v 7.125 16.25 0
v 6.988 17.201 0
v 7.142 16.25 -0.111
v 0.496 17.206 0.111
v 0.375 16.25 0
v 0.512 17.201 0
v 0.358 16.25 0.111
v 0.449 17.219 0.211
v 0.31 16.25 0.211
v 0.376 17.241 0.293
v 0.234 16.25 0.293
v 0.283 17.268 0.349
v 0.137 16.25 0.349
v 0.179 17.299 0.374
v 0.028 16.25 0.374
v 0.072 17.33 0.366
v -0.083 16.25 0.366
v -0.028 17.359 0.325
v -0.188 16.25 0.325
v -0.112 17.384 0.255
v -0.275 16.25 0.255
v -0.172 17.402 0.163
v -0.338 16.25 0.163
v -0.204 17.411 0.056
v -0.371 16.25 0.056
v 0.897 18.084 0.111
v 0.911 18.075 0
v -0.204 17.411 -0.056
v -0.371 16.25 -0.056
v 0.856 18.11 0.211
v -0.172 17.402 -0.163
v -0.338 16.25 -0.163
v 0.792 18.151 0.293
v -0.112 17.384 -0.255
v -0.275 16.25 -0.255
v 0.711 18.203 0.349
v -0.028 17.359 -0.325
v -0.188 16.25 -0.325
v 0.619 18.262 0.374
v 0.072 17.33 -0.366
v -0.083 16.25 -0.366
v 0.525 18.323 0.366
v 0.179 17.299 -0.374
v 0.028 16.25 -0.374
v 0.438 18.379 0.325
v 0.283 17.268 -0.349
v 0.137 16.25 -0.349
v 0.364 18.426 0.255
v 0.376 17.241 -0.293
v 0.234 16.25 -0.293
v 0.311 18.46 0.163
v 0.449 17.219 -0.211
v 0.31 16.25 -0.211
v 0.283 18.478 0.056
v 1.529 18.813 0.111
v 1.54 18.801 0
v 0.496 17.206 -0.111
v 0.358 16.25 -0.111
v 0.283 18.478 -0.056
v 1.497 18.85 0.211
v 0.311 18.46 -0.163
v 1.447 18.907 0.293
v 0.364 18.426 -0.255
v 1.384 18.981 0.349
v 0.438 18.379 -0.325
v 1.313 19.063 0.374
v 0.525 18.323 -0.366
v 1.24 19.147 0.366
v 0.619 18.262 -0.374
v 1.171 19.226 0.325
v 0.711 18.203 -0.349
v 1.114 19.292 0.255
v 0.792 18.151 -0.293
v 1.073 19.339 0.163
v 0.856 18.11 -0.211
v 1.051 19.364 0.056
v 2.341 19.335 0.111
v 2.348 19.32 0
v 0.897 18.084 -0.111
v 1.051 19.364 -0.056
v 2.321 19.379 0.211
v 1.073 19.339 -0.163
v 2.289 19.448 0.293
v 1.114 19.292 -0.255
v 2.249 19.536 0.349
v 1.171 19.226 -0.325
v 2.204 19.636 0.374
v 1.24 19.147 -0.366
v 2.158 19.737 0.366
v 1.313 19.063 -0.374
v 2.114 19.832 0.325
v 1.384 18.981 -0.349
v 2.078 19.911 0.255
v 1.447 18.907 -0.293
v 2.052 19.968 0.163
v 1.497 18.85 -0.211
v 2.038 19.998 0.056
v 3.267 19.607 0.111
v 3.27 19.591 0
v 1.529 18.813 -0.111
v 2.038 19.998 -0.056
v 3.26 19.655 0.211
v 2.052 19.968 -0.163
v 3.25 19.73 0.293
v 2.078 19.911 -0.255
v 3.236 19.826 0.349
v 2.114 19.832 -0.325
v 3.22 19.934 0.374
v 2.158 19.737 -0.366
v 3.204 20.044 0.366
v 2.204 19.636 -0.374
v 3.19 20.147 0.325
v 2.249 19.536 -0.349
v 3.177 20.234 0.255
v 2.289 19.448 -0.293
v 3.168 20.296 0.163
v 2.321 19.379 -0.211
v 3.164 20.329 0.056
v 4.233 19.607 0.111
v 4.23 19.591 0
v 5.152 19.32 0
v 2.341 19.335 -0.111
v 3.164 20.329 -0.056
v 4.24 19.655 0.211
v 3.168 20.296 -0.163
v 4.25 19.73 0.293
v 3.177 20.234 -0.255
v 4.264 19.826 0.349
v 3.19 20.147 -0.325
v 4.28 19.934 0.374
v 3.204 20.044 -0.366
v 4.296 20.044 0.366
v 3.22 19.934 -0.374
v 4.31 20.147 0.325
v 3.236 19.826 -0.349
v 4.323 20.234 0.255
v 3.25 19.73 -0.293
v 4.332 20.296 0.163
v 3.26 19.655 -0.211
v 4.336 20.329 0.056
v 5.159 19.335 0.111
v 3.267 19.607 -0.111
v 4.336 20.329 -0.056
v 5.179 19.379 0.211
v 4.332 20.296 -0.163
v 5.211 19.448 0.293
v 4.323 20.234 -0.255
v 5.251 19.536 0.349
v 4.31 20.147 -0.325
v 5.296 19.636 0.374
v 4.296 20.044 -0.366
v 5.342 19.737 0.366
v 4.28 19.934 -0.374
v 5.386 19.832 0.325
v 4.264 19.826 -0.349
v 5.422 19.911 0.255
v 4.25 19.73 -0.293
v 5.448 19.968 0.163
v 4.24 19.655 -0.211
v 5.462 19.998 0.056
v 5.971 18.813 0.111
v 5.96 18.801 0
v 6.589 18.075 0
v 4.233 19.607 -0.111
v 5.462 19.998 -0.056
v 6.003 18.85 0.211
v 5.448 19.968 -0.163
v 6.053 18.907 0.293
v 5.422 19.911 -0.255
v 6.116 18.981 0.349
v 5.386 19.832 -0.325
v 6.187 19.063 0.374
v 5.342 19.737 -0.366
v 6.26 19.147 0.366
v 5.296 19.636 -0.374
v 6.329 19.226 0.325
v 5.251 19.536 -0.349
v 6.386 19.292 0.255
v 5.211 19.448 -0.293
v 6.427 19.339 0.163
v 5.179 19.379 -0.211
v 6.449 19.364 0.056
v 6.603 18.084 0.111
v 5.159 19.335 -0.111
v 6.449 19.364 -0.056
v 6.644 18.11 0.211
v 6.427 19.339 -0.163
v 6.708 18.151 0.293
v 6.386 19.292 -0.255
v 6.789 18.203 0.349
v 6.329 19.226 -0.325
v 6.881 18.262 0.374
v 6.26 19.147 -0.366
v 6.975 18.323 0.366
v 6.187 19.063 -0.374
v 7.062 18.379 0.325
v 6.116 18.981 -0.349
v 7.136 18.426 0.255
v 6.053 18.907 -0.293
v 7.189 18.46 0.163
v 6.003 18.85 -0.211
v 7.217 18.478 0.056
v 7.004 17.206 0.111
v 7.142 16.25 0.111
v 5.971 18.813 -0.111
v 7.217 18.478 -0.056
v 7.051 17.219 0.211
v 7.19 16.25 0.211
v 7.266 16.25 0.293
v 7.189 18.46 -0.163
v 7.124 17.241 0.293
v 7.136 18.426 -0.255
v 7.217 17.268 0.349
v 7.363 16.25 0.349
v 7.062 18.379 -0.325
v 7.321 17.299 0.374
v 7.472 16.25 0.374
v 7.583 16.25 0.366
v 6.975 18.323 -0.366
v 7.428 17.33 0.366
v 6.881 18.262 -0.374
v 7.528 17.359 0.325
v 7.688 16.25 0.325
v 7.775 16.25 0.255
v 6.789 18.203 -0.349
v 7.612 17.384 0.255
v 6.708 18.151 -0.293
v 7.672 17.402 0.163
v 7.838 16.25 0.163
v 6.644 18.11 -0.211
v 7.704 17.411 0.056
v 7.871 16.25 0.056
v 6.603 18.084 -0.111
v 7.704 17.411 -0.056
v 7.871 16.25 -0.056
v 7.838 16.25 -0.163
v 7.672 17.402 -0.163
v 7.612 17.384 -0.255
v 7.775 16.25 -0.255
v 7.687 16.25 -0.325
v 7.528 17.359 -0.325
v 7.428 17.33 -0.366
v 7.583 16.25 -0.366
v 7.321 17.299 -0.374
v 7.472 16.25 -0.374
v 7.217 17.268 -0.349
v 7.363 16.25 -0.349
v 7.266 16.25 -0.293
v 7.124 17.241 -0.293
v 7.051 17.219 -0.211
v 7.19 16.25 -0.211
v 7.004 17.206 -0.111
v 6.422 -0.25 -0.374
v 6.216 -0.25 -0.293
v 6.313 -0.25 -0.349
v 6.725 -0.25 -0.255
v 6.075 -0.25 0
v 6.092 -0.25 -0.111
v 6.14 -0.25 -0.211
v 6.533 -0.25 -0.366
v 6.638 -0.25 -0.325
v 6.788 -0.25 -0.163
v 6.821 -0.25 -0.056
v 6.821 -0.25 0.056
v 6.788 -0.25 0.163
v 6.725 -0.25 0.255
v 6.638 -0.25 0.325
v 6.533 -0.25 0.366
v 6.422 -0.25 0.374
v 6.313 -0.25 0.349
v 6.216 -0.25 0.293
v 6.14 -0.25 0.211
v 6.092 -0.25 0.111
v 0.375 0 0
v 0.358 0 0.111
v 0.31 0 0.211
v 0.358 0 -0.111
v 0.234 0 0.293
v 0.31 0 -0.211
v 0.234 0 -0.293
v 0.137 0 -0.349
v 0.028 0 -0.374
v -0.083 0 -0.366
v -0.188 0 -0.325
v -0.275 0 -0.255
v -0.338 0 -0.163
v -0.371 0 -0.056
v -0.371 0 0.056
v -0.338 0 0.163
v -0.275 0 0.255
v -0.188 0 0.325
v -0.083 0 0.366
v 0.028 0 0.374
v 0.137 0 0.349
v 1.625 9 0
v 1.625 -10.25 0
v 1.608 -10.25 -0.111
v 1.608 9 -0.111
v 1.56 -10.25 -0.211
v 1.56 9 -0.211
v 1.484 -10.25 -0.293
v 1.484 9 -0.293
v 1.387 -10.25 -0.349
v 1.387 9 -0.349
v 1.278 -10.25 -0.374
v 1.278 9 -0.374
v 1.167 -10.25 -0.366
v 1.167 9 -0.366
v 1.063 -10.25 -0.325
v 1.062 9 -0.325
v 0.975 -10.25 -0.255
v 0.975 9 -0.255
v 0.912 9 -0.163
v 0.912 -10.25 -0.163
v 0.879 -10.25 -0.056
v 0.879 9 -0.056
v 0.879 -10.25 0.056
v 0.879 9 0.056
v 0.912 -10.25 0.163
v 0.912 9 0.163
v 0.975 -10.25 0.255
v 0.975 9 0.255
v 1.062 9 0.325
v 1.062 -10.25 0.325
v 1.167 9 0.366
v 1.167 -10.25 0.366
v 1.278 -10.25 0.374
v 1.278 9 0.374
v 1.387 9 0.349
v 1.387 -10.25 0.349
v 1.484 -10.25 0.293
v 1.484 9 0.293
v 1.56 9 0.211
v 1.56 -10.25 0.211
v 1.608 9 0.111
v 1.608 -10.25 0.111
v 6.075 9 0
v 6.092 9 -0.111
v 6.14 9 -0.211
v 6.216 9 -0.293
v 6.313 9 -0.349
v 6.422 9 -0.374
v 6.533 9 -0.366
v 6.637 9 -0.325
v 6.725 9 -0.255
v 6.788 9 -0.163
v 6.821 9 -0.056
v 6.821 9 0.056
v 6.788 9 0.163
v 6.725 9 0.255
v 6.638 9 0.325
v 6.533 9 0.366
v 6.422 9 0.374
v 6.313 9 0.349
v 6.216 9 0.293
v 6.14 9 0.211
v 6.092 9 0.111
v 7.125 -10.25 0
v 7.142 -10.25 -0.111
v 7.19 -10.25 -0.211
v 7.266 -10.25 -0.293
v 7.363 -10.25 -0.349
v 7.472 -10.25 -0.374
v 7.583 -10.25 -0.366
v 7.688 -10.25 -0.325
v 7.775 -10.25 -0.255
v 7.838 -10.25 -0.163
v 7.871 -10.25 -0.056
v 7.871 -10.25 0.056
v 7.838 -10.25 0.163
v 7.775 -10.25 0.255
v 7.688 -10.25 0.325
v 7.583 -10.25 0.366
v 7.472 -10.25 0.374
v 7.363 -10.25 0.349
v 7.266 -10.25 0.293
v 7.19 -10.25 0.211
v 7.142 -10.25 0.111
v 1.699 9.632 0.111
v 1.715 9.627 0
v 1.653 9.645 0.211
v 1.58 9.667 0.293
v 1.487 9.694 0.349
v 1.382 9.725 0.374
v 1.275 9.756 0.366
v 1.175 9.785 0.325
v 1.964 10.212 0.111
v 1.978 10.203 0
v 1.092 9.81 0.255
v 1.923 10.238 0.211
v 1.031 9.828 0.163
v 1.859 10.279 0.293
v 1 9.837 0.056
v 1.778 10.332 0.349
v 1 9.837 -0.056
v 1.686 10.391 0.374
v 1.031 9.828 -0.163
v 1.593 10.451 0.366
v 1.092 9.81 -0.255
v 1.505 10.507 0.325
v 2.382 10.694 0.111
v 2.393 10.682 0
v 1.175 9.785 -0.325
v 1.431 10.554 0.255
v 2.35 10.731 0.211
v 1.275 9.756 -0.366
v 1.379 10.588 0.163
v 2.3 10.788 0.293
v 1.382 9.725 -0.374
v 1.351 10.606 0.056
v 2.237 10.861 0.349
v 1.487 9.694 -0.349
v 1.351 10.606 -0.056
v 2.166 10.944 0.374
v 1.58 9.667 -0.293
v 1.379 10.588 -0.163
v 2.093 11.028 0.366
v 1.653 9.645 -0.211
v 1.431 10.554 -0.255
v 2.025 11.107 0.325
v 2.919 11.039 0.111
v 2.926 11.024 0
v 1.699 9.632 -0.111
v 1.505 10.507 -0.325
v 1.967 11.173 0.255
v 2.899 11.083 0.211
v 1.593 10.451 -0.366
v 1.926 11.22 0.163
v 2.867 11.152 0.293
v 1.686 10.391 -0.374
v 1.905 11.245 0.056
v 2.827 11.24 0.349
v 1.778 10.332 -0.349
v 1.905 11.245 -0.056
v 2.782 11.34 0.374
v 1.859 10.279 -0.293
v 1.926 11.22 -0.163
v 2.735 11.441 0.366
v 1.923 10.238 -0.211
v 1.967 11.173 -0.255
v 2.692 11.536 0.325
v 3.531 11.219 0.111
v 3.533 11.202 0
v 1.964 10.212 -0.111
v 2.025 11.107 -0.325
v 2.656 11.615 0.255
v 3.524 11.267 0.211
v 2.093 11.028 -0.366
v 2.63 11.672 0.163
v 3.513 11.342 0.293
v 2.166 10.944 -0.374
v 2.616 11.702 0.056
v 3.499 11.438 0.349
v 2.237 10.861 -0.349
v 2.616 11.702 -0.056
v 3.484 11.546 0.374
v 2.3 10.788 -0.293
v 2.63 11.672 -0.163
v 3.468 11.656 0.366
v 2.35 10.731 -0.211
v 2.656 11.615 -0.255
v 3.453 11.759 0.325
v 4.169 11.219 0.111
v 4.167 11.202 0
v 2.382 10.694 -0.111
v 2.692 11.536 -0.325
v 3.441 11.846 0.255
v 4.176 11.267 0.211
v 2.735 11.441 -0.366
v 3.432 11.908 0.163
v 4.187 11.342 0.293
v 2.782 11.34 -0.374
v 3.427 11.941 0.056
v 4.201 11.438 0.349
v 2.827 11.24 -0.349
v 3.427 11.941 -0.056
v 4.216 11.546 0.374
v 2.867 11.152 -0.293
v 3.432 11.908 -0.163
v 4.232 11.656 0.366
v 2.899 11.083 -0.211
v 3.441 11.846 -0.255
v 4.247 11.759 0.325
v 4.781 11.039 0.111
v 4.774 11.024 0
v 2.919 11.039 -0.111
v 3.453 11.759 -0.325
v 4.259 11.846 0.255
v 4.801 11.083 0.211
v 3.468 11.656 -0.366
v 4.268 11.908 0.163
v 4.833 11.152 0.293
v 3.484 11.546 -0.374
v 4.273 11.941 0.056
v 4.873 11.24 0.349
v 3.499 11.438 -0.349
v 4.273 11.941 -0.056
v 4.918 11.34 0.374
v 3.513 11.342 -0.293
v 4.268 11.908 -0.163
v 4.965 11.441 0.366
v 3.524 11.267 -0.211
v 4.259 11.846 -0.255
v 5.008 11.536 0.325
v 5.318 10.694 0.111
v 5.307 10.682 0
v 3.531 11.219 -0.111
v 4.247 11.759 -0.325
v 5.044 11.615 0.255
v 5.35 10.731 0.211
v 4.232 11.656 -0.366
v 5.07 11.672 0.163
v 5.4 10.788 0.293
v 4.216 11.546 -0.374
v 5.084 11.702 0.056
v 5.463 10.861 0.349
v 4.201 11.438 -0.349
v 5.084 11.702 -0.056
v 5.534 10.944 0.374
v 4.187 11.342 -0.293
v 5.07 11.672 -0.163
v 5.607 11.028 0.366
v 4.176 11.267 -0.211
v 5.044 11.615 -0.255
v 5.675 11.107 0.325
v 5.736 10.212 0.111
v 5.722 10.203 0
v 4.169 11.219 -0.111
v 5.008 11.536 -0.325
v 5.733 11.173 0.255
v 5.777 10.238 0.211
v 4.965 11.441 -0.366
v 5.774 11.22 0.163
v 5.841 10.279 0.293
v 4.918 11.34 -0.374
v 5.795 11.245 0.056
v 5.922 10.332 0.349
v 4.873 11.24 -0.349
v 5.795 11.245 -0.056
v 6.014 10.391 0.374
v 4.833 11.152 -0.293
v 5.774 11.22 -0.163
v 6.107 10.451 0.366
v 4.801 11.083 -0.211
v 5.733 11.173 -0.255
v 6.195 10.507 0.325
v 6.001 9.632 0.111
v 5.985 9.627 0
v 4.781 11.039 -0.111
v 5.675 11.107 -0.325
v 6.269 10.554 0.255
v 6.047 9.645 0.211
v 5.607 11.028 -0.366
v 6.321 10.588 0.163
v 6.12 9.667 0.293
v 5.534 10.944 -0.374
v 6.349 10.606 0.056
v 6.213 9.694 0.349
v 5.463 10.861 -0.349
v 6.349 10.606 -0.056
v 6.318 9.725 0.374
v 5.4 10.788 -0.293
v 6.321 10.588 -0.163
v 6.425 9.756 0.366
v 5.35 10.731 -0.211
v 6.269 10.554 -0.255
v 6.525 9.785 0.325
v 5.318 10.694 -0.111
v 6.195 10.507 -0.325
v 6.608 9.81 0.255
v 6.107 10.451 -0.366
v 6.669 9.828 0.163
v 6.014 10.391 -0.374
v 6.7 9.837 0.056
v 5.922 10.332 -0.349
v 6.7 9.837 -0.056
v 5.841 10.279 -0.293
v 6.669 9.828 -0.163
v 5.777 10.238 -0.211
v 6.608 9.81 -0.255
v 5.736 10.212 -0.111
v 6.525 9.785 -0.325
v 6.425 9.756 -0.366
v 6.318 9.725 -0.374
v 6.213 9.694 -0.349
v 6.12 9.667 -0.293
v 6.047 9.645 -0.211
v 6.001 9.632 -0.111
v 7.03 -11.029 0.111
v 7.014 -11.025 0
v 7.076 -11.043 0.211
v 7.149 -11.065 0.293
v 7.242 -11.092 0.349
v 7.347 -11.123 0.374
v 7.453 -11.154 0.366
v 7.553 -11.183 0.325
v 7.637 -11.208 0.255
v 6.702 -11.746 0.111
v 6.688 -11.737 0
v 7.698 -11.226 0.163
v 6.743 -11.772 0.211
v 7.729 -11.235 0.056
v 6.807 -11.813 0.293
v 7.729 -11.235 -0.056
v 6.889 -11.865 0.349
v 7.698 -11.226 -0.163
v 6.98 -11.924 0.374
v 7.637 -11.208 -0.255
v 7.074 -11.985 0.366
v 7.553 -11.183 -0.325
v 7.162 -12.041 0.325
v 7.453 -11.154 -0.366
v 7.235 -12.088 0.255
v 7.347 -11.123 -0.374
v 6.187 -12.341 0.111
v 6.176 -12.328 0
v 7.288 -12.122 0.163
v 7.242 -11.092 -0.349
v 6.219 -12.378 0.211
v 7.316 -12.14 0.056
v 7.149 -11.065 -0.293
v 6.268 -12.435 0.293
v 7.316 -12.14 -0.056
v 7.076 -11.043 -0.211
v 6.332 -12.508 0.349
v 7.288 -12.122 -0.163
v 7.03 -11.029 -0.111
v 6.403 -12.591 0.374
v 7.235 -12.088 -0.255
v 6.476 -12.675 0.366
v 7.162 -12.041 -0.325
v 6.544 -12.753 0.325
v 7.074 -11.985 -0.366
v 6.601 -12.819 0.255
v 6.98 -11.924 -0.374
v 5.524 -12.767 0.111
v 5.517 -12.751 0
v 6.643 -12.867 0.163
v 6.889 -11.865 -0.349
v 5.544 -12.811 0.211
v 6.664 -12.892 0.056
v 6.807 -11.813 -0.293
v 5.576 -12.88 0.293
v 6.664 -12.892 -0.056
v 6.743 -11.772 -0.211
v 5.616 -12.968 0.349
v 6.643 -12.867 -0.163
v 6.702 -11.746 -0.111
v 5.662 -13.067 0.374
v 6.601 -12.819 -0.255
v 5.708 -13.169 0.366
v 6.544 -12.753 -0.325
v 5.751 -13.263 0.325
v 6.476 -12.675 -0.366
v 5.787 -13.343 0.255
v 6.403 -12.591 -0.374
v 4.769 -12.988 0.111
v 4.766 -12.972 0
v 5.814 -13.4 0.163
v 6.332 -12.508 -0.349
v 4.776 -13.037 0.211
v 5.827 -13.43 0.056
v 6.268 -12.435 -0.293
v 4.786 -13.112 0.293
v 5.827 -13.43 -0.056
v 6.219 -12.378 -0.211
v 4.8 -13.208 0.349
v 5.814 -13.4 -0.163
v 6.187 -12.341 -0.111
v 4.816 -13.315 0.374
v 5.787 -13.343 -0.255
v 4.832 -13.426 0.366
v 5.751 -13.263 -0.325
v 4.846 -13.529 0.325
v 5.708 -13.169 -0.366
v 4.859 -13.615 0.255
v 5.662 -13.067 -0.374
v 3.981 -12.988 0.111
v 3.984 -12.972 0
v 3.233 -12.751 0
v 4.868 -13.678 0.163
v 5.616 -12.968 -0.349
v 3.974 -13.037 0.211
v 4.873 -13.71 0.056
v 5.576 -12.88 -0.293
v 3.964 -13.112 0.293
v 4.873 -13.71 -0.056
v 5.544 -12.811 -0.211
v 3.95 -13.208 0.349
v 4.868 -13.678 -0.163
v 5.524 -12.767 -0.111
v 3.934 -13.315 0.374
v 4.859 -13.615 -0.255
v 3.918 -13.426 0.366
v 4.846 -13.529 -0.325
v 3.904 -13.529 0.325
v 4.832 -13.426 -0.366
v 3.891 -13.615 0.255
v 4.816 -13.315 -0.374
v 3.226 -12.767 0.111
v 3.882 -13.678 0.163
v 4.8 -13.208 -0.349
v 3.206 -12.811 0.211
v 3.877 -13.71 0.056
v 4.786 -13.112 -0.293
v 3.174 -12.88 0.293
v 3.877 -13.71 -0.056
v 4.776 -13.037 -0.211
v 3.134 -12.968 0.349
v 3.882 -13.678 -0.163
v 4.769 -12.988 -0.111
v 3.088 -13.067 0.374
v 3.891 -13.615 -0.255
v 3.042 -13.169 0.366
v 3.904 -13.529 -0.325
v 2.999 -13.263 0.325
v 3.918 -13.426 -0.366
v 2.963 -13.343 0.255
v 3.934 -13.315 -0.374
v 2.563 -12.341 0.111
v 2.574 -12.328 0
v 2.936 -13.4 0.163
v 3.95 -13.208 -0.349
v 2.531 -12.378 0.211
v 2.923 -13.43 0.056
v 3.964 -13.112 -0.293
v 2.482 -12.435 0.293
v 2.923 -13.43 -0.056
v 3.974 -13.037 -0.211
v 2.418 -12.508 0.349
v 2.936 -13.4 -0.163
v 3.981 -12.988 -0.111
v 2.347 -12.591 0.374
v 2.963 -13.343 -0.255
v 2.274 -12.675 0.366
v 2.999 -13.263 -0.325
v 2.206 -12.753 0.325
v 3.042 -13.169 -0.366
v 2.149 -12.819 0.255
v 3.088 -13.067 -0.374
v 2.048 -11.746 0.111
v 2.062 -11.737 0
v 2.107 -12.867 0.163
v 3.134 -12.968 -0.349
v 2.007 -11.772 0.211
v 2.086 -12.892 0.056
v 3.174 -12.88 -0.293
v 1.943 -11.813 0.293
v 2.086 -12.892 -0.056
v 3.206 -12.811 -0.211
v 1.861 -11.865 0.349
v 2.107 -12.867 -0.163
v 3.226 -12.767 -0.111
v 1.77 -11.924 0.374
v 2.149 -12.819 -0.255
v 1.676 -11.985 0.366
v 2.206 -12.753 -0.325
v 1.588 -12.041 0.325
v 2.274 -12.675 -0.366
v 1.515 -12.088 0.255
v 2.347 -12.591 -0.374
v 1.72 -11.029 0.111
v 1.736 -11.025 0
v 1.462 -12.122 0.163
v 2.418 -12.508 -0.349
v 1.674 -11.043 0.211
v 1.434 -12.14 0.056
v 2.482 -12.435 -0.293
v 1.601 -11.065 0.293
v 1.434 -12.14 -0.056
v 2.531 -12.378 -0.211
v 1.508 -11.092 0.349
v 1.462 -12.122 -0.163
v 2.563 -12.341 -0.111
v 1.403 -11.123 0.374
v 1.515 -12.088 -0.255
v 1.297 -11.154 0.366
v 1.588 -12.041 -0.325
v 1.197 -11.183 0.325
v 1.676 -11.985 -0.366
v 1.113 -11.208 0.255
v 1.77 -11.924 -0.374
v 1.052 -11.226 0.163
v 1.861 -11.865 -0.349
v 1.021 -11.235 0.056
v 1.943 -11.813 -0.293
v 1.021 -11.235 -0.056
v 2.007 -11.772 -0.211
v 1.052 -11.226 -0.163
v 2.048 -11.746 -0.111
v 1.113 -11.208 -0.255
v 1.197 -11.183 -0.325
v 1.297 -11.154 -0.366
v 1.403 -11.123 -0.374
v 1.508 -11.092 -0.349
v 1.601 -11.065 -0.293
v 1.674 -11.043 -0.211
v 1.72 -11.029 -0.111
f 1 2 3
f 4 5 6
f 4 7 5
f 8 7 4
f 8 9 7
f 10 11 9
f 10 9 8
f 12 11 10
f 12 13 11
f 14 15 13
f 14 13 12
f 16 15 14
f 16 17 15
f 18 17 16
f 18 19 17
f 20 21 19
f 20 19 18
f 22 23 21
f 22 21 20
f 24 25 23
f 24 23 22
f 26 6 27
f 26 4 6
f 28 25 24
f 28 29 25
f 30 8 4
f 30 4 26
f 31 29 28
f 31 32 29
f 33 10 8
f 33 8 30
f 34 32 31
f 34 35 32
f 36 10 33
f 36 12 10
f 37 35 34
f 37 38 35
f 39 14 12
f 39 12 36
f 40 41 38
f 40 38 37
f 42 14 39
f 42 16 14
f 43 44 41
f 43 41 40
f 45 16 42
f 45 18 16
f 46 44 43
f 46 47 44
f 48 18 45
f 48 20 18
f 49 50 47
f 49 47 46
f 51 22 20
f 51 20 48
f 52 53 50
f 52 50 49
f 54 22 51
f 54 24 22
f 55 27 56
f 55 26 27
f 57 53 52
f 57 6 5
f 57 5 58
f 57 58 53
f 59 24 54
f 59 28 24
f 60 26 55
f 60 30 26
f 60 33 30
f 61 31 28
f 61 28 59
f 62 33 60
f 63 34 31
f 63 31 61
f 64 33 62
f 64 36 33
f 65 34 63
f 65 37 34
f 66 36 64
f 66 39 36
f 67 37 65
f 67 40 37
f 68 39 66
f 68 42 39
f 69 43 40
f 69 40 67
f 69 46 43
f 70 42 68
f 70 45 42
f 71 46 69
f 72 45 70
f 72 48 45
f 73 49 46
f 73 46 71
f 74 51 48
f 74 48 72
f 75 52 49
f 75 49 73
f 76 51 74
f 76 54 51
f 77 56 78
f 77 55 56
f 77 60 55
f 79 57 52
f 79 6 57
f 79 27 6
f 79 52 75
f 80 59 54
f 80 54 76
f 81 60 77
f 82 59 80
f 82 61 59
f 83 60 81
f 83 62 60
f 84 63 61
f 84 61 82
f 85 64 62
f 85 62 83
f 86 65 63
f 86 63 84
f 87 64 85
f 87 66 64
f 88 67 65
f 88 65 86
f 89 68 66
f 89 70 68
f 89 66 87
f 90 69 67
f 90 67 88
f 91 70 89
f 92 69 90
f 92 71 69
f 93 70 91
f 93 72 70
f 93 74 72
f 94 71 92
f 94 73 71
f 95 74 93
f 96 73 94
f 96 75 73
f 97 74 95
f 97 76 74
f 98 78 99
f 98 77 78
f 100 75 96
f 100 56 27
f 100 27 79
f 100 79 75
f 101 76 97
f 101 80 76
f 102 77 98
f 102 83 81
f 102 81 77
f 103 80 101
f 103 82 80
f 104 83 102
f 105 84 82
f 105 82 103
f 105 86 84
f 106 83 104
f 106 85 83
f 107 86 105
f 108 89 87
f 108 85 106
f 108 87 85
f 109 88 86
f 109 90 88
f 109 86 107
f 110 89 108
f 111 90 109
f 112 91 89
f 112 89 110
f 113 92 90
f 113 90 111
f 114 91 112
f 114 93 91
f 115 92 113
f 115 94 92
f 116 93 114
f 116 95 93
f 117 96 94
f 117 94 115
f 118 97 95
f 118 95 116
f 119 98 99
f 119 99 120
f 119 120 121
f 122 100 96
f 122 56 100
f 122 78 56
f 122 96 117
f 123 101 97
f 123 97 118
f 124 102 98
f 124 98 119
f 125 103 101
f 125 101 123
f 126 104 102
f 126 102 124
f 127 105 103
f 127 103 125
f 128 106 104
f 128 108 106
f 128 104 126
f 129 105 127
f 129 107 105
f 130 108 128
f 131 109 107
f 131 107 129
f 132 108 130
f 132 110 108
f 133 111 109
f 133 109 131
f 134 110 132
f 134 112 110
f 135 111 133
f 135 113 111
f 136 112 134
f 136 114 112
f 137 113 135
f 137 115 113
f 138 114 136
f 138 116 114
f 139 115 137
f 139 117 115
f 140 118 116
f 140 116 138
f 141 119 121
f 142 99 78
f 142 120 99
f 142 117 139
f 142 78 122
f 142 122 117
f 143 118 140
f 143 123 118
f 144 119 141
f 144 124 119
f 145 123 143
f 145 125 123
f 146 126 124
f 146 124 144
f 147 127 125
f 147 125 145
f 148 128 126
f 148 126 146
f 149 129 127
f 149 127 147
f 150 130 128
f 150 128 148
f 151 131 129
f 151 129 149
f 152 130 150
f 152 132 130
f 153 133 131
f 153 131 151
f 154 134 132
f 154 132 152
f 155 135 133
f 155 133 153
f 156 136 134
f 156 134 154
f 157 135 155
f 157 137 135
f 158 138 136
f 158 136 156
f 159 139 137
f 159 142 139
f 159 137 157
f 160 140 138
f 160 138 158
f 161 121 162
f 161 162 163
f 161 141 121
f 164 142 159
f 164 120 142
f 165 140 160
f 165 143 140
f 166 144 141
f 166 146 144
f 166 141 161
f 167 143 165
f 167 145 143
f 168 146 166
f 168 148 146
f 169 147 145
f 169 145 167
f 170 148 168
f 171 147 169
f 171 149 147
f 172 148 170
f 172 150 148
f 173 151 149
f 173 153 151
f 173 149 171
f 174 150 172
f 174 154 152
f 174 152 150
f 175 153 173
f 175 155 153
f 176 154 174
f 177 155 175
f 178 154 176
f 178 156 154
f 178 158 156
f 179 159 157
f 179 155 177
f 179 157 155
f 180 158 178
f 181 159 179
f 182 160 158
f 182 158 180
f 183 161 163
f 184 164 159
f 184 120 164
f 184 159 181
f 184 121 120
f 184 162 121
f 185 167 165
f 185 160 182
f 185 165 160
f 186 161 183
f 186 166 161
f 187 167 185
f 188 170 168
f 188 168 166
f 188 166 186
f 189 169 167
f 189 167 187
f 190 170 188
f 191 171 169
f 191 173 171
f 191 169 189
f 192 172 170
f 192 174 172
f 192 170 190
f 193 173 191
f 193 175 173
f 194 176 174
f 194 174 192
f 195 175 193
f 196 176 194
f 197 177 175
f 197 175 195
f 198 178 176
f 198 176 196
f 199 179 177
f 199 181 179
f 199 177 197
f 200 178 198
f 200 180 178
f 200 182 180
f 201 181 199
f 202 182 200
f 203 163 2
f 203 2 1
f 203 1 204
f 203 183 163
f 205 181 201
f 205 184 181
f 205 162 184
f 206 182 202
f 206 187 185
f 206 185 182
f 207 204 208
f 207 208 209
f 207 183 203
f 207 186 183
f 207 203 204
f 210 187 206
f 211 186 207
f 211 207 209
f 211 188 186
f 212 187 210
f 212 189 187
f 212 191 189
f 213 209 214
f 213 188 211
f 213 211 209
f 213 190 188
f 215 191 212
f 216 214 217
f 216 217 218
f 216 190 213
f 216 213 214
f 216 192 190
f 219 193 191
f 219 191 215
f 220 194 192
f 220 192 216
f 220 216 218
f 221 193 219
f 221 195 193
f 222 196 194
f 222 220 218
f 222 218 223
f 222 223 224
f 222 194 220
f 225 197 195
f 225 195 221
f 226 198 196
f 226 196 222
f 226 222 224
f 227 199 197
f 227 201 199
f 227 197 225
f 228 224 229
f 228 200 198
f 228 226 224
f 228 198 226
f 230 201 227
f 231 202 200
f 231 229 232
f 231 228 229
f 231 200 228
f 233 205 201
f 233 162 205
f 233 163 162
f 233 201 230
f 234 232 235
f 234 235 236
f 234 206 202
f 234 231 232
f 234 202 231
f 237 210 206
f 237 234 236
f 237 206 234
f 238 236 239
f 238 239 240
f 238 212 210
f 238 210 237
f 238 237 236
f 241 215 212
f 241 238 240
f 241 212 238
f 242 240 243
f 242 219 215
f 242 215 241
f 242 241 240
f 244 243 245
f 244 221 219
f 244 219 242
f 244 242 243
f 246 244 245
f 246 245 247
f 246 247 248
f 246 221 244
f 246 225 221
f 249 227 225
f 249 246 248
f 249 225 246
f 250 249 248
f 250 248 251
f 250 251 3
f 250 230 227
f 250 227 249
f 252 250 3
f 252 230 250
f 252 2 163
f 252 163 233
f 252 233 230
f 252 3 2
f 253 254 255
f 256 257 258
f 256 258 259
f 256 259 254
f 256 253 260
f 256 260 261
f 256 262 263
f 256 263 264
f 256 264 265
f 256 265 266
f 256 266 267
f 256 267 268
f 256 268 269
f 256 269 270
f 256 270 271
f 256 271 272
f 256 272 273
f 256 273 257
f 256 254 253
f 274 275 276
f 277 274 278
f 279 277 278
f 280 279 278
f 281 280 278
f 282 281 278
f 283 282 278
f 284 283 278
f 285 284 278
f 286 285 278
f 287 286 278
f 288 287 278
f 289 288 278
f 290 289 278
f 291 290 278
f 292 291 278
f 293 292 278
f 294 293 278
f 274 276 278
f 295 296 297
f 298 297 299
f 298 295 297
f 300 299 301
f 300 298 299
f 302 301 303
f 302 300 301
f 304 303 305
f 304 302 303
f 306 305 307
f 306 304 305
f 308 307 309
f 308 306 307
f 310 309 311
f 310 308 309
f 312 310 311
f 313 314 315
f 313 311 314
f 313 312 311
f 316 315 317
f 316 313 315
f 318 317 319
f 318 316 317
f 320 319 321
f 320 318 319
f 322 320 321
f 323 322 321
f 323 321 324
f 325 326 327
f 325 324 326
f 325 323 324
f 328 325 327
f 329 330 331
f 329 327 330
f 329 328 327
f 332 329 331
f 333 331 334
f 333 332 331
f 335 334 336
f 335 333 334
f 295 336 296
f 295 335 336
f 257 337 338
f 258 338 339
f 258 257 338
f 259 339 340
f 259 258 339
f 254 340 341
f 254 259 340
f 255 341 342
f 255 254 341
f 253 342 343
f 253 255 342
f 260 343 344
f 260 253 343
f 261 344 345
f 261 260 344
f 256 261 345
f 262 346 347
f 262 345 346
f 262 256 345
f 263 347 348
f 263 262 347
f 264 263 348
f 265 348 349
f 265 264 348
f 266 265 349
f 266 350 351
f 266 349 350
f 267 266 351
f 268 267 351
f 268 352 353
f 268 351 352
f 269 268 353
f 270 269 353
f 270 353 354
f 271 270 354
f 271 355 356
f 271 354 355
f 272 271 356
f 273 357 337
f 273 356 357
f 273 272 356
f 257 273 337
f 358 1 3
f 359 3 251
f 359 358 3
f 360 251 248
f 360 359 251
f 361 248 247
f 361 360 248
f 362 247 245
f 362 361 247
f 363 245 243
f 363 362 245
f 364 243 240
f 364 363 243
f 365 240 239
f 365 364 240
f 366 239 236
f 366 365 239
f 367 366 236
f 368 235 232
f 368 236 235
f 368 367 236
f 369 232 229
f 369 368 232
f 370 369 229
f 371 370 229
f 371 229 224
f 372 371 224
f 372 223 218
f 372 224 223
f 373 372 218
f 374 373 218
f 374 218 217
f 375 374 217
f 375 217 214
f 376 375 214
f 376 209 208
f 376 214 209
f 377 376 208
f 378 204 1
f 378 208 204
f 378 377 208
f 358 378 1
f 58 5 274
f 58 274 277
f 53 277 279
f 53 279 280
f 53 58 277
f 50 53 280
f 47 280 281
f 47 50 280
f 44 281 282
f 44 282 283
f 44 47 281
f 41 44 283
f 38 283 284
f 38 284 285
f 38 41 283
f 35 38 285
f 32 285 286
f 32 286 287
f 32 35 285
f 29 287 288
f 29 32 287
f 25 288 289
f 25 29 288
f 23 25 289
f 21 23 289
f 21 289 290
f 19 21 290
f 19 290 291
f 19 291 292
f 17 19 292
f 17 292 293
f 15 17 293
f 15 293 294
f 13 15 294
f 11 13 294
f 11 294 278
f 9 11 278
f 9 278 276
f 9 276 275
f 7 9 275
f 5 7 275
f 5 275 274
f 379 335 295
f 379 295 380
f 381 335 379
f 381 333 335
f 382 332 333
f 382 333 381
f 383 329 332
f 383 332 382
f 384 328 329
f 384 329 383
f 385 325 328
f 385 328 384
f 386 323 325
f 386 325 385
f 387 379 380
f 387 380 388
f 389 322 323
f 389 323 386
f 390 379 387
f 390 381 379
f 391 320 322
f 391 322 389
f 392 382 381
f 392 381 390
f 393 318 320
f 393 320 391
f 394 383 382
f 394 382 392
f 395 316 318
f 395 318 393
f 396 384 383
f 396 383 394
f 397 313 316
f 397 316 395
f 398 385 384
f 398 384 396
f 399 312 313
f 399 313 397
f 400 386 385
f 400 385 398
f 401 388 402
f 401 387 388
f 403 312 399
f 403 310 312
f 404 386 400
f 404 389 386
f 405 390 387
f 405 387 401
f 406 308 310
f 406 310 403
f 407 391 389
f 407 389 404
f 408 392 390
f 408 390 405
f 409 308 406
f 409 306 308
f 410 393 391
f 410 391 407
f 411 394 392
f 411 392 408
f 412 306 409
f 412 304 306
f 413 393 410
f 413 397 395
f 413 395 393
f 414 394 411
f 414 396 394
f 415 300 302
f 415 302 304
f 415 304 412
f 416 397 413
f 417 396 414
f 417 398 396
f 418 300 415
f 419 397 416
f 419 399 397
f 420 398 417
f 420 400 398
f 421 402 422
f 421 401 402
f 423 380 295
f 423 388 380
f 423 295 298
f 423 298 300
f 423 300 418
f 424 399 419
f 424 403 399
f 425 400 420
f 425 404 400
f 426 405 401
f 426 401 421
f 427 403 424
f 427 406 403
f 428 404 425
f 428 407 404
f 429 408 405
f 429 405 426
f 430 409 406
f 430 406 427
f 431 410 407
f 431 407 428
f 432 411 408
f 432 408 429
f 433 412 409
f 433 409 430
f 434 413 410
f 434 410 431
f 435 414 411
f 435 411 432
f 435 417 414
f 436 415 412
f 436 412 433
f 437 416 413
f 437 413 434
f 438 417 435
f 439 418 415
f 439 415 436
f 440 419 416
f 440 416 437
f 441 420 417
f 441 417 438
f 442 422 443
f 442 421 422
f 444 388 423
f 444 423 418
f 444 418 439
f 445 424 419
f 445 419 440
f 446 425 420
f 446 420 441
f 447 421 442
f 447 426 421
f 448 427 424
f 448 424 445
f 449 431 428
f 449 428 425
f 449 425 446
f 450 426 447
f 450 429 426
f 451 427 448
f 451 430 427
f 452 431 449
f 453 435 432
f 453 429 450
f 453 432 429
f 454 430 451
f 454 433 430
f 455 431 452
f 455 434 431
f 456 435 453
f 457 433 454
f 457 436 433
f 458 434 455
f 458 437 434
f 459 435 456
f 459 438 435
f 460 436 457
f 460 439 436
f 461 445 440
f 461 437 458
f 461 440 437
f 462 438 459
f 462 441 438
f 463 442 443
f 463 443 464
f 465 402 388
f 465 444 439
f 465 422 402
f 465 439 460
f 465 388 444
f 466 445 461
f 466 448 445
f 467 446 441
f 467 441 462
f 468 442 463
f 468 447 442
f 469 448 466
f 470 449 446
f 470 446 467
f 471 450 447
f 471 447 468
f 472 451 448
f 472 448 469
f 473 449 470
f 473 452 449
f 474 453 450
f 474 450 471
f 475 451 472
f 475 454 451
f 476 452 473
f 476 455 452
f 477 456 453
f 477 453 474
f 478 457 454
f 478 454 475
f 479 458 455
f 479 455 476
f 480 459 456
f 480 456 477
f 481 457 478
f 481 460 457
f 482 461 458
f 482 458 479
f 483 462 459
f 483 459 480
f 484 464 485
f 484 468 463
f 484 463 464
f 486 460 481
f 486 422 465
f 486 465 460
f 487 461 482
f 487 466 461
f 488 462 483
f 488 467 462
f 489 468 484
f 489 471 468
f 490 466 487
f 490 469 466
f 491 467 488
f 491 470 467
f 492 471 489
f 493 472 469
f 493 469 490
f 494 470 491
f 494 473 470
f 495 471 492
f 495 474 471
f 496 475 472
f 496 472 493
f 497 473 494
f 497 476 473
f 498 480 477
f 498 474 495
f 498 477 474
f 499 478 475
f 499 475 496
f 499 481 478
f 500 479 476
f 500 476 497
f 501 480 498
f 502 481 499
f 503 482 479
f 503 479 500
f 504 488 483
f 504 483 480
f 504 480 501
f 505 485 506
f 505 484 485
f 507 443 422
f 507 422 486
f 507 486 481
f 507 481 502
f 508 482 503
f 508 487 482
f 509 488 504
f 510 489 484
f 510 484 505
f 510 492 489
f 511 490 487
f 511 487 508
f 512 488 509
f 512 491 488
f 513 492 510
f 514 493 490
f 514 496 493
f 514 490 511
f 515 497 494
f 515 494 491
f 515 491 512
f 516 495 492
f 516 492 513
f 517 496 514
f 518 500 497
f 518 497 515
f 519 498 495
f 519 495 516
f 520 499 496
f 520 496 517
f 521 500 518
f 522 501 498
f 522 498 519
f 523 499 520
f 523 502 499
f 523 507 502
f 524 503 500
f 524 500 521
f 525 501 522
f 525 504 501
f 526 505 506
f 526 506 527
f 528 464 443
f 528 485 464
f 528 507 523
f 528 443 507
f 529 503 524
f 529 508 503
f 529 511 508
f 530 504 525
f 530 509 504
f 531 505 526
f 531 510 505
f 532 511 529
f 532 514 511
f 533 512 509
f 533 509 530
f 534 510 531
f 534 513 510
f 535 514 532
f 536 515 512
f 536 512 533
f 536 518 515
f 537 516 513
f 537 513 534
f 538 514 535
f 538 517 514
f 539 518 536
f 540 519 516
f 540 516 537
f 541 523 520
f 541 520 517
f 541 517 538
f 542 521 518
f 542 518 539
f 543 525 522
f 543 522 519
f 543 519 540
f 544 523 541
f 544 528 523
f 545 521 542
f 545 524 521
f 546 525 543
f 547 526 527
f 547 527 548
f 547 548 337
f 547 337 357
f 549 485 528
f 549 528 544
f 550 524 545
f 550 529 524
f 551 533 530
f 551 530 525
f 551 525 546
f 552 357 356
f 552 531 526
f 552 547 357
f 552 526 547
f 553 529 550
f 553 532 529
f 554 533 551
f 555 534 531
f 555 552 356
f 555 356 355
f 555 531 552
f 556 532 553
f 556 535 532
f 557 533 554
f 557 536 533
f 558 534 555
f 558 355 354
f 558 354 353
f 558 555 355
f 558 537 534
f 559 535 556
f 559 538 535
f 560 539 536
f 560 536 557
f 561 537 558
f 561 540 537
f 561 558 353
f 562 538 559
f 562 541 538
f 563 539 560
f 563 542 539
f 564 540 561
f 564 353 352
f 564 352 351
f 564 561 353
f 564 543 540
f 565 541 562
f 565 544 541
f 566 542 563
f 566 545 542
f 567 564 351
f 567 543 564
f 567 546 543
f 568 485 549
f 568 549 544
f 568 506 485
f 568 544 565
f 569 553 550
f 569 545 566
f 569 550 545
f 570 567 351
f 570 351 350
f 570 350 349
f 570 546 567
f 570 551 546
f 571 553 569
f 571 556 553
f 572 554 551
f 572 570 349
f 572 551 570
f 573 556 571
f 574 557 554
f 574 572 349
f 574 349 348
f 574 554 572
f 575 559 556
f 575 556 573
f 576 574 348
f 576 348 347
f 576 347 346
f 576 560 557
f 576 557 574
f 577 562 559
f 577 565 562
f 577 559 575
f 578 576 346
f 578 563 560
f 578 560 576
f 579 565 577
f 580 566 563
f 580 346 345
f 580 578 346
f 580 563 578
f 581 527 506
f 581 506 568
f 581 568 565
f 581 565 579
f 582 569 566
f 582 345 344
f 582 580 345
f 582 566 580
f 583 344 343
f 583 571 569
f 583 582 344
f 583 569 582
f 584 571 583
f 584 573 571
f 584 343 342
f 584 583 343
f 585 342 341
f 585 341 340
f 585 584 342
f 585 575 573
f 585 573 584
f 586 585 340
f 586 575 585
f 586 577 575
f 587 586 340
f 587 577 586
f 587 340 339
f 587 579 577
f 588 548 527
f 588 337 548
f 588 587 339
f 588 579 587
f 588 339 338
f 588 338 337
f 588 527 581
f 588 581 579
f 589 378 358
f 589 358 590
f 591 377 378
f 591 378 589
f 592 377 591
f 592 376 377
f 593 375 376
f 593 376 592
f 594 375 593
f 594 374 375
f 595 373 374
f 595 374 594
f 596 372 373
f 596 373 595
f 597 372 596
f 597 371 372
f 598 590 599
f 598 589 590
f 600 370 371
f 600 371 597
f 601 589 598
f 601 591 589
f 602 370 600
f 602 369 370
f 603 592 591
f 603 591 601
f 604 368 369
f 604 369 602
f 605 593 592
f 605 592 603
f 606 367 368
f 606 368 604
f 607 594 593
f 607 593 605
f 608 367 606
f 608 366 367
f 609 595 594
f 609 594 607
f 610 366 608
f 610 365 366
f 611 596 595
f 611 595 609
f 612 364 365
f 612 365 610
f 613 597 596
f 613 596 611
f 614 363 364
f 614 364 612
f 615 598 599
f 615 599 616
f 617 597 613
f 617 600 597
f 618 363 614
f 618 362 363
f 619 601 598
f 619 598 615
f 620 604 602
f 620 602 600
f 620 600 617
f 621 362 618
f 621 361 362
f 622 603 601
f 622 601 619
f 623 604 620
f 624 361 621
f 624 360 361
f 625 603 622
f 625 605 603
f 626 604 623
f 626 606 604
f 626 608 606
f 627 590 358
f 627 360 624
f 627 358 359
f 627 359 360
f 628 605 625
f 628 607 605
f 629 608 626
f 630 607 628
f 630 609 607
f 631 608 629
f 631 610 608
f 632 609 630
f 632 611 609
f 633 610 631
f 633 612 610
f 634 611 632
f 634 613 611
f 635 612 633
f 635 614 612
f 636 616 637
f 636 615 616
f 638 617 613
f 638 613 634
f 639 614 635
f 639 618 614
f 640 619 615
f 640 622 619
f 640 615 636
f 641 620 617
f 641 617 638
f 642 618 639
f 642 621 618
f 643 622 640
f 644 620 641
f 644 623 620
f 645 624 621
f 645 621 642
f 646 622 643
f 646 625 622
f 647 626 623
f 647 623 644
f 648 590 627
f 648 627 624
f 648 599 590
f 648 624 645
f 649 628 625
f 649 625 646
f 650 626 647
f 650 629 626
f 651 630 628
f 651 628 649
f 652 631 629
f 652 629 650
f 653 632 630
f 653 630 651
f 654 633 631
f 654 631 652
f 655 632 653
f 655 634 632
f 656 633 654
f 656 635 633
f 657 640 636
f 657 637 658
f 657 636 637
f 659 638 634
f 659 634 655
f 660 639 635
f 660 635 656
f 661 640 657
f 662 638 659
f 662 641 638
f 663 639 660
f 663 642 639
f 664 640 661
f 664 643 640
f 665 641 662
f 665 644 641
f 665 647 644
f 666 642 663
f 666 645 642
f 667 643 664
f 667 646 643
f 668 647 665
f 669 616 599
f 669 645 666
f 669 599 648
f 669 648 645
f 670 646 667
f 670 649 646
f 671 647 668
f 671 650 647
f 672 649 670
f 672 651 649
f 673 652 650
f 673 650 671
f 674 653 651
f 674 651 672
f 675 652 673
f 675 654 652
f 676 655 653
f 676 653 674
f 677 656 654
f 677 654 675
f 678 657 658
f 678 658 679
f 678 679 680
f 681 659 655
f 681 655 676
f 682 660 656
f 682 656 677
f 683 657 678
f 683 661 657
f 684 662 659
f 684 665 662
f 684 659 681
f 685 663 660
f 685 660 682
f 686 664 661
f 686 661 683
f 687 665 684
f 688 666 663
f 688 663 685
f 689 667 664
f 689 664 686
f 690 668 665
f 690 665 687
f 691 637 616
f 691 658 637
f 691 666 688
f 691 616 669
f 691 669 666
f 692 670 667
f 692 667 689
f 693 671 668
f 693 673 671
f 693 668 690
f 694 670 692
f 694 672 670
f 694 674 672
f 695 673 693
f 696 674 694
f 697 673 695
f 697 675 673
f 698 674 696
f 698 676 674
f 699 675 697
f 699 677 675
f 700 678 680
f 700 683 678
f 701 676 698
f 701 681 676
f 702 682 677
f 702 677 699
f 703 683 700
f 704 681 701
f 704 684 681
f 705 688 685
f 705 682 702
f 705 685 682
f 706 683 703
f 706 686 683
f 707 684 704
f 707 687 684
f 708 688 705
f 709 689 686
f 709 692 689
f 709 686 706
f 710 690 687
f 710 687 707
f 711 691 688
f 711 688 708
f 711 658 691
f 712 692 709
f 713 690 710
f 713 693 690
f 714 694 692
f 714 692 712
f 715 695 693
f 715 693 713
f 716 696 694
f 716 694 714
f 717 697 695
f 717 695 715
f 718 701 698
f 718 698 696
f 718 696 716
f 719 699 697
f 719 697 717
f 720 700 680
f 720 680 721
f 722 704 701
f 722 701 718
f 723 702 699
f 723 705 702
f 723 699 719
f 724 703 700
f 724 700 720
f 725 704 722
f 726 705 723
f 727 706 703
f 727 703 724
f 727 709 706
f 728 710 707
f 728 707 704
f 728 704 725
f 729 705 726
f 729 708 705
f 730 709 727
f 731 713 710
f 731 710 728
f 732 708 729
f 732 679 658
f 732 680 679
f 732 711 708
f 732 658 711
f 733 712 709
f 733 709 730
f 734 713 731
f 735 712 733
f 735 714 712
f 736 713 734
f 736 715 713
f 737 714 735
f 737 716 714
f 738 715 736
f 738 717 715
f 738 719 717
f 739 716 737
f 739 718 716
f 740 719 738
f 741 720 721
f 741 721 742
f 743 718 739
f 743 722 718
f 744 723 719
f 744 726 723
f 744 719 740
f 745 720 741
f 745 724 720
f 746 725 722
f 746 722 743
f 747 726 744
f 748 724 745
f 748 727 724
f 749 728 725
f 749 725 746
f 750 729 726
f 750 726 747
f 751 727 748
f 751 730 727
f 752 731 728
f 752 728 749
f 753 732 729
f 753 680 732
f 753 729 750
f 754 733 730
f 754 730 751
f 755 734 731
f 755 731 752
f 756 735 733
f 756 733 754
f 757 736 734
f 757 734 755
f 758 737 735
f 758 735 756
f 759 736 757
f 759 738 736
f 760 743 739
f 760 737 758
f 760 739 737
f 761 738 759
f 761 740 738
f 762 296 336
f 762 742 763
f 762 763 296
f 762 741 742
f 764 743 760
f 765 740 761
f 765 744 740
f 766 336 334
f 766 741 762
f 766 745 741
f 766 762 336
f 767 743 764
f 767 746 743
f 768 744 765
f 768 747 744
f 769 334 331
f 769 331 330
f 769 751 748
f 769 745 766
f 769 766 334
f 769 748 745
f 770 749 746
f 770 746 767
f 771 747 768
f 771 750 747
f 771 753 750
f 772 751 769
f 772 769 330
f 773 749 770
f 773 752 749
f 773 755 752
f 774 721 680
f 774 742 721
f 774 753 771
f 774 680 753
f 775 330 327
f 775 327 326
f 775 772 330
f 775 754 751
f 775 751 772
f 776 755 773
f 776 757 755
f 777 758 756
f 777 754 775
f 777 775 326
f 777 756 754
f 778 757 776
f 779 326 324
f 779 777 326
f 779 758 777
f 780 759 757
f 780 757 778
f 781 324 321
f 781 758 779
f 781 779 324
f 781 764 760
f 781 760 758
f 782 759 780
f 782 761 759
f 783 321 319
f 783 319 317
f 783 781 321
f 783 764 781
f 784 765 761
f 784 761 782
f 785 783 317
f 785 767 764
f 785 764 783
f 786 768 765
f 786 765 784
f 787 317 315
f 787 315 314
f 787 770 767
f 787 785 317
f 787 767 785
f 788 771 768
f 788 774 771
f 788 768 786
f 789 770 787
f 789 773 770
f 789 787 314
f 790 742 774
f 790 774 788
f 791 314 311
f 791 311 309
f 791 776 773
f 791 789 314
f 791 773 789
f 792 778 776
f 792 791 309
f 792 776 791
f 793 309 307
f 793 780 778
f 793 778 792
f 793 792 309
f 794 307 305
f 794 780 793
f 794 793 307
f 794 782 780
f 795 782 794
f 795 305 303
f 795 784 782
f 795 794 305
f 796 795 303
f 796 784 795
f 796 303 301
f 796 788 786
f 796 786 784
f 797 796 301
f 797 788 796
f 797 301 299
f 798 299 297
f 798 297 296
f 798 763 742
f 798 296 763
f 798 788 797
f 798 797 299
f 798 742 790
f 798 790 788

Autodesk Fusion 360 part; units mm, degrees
sketch "Paper clip path" plane through (0, 0, 0) normal (0, 0, 1) x (1, 0, 0)
  line L0 (0, 0) -> (0, 16.25)
  line L1 (0, 16.25) -> (7.5, 16.25)
  line L2 (7.5, 16.25) -> (7.5, -10.25)
  line L3 (7.5, -10.25) -> (1.25, -10.25)
  line L4 (1.25, -10.25) -> (1.25, 9)
  line L5 (1.25, 9) -> (6.45, 9)
  line L6 (6.45, 9) -> (6.45, -0.25)
  arc A0 (7.5, 16.25) -> (0, 16.25) centre (3.75, 16.25) ccw
  arc A1 (6.45, 9) -> (1.25, 9) centre (3.85, 9) ccw
  arc A2 (1.25, -10.25) -> (7.5, -10.25) centre (4.375, -10.25) ccw
  dimension "d1" = 16.25
  dimension "d2" = 7.5
  dimension "d3" = 26.5
  dimension "d4" = 6.25
  dimension "d5" = 19.25
  dimension "d6" = 5.2
  dimension "d7" = 9.25
sketch "hole" plane through (0, 0, 0) normal (0, 1, 0) x (1, 0, 0)
  circle A0 centre (0, 0) radius 0.375
  dimension "d8" = 0.75
sweep "Sweep1" add profiles "hole" path "Paper clip path" along L0 A0 L2 A2 L4 A1 L6 section 1
